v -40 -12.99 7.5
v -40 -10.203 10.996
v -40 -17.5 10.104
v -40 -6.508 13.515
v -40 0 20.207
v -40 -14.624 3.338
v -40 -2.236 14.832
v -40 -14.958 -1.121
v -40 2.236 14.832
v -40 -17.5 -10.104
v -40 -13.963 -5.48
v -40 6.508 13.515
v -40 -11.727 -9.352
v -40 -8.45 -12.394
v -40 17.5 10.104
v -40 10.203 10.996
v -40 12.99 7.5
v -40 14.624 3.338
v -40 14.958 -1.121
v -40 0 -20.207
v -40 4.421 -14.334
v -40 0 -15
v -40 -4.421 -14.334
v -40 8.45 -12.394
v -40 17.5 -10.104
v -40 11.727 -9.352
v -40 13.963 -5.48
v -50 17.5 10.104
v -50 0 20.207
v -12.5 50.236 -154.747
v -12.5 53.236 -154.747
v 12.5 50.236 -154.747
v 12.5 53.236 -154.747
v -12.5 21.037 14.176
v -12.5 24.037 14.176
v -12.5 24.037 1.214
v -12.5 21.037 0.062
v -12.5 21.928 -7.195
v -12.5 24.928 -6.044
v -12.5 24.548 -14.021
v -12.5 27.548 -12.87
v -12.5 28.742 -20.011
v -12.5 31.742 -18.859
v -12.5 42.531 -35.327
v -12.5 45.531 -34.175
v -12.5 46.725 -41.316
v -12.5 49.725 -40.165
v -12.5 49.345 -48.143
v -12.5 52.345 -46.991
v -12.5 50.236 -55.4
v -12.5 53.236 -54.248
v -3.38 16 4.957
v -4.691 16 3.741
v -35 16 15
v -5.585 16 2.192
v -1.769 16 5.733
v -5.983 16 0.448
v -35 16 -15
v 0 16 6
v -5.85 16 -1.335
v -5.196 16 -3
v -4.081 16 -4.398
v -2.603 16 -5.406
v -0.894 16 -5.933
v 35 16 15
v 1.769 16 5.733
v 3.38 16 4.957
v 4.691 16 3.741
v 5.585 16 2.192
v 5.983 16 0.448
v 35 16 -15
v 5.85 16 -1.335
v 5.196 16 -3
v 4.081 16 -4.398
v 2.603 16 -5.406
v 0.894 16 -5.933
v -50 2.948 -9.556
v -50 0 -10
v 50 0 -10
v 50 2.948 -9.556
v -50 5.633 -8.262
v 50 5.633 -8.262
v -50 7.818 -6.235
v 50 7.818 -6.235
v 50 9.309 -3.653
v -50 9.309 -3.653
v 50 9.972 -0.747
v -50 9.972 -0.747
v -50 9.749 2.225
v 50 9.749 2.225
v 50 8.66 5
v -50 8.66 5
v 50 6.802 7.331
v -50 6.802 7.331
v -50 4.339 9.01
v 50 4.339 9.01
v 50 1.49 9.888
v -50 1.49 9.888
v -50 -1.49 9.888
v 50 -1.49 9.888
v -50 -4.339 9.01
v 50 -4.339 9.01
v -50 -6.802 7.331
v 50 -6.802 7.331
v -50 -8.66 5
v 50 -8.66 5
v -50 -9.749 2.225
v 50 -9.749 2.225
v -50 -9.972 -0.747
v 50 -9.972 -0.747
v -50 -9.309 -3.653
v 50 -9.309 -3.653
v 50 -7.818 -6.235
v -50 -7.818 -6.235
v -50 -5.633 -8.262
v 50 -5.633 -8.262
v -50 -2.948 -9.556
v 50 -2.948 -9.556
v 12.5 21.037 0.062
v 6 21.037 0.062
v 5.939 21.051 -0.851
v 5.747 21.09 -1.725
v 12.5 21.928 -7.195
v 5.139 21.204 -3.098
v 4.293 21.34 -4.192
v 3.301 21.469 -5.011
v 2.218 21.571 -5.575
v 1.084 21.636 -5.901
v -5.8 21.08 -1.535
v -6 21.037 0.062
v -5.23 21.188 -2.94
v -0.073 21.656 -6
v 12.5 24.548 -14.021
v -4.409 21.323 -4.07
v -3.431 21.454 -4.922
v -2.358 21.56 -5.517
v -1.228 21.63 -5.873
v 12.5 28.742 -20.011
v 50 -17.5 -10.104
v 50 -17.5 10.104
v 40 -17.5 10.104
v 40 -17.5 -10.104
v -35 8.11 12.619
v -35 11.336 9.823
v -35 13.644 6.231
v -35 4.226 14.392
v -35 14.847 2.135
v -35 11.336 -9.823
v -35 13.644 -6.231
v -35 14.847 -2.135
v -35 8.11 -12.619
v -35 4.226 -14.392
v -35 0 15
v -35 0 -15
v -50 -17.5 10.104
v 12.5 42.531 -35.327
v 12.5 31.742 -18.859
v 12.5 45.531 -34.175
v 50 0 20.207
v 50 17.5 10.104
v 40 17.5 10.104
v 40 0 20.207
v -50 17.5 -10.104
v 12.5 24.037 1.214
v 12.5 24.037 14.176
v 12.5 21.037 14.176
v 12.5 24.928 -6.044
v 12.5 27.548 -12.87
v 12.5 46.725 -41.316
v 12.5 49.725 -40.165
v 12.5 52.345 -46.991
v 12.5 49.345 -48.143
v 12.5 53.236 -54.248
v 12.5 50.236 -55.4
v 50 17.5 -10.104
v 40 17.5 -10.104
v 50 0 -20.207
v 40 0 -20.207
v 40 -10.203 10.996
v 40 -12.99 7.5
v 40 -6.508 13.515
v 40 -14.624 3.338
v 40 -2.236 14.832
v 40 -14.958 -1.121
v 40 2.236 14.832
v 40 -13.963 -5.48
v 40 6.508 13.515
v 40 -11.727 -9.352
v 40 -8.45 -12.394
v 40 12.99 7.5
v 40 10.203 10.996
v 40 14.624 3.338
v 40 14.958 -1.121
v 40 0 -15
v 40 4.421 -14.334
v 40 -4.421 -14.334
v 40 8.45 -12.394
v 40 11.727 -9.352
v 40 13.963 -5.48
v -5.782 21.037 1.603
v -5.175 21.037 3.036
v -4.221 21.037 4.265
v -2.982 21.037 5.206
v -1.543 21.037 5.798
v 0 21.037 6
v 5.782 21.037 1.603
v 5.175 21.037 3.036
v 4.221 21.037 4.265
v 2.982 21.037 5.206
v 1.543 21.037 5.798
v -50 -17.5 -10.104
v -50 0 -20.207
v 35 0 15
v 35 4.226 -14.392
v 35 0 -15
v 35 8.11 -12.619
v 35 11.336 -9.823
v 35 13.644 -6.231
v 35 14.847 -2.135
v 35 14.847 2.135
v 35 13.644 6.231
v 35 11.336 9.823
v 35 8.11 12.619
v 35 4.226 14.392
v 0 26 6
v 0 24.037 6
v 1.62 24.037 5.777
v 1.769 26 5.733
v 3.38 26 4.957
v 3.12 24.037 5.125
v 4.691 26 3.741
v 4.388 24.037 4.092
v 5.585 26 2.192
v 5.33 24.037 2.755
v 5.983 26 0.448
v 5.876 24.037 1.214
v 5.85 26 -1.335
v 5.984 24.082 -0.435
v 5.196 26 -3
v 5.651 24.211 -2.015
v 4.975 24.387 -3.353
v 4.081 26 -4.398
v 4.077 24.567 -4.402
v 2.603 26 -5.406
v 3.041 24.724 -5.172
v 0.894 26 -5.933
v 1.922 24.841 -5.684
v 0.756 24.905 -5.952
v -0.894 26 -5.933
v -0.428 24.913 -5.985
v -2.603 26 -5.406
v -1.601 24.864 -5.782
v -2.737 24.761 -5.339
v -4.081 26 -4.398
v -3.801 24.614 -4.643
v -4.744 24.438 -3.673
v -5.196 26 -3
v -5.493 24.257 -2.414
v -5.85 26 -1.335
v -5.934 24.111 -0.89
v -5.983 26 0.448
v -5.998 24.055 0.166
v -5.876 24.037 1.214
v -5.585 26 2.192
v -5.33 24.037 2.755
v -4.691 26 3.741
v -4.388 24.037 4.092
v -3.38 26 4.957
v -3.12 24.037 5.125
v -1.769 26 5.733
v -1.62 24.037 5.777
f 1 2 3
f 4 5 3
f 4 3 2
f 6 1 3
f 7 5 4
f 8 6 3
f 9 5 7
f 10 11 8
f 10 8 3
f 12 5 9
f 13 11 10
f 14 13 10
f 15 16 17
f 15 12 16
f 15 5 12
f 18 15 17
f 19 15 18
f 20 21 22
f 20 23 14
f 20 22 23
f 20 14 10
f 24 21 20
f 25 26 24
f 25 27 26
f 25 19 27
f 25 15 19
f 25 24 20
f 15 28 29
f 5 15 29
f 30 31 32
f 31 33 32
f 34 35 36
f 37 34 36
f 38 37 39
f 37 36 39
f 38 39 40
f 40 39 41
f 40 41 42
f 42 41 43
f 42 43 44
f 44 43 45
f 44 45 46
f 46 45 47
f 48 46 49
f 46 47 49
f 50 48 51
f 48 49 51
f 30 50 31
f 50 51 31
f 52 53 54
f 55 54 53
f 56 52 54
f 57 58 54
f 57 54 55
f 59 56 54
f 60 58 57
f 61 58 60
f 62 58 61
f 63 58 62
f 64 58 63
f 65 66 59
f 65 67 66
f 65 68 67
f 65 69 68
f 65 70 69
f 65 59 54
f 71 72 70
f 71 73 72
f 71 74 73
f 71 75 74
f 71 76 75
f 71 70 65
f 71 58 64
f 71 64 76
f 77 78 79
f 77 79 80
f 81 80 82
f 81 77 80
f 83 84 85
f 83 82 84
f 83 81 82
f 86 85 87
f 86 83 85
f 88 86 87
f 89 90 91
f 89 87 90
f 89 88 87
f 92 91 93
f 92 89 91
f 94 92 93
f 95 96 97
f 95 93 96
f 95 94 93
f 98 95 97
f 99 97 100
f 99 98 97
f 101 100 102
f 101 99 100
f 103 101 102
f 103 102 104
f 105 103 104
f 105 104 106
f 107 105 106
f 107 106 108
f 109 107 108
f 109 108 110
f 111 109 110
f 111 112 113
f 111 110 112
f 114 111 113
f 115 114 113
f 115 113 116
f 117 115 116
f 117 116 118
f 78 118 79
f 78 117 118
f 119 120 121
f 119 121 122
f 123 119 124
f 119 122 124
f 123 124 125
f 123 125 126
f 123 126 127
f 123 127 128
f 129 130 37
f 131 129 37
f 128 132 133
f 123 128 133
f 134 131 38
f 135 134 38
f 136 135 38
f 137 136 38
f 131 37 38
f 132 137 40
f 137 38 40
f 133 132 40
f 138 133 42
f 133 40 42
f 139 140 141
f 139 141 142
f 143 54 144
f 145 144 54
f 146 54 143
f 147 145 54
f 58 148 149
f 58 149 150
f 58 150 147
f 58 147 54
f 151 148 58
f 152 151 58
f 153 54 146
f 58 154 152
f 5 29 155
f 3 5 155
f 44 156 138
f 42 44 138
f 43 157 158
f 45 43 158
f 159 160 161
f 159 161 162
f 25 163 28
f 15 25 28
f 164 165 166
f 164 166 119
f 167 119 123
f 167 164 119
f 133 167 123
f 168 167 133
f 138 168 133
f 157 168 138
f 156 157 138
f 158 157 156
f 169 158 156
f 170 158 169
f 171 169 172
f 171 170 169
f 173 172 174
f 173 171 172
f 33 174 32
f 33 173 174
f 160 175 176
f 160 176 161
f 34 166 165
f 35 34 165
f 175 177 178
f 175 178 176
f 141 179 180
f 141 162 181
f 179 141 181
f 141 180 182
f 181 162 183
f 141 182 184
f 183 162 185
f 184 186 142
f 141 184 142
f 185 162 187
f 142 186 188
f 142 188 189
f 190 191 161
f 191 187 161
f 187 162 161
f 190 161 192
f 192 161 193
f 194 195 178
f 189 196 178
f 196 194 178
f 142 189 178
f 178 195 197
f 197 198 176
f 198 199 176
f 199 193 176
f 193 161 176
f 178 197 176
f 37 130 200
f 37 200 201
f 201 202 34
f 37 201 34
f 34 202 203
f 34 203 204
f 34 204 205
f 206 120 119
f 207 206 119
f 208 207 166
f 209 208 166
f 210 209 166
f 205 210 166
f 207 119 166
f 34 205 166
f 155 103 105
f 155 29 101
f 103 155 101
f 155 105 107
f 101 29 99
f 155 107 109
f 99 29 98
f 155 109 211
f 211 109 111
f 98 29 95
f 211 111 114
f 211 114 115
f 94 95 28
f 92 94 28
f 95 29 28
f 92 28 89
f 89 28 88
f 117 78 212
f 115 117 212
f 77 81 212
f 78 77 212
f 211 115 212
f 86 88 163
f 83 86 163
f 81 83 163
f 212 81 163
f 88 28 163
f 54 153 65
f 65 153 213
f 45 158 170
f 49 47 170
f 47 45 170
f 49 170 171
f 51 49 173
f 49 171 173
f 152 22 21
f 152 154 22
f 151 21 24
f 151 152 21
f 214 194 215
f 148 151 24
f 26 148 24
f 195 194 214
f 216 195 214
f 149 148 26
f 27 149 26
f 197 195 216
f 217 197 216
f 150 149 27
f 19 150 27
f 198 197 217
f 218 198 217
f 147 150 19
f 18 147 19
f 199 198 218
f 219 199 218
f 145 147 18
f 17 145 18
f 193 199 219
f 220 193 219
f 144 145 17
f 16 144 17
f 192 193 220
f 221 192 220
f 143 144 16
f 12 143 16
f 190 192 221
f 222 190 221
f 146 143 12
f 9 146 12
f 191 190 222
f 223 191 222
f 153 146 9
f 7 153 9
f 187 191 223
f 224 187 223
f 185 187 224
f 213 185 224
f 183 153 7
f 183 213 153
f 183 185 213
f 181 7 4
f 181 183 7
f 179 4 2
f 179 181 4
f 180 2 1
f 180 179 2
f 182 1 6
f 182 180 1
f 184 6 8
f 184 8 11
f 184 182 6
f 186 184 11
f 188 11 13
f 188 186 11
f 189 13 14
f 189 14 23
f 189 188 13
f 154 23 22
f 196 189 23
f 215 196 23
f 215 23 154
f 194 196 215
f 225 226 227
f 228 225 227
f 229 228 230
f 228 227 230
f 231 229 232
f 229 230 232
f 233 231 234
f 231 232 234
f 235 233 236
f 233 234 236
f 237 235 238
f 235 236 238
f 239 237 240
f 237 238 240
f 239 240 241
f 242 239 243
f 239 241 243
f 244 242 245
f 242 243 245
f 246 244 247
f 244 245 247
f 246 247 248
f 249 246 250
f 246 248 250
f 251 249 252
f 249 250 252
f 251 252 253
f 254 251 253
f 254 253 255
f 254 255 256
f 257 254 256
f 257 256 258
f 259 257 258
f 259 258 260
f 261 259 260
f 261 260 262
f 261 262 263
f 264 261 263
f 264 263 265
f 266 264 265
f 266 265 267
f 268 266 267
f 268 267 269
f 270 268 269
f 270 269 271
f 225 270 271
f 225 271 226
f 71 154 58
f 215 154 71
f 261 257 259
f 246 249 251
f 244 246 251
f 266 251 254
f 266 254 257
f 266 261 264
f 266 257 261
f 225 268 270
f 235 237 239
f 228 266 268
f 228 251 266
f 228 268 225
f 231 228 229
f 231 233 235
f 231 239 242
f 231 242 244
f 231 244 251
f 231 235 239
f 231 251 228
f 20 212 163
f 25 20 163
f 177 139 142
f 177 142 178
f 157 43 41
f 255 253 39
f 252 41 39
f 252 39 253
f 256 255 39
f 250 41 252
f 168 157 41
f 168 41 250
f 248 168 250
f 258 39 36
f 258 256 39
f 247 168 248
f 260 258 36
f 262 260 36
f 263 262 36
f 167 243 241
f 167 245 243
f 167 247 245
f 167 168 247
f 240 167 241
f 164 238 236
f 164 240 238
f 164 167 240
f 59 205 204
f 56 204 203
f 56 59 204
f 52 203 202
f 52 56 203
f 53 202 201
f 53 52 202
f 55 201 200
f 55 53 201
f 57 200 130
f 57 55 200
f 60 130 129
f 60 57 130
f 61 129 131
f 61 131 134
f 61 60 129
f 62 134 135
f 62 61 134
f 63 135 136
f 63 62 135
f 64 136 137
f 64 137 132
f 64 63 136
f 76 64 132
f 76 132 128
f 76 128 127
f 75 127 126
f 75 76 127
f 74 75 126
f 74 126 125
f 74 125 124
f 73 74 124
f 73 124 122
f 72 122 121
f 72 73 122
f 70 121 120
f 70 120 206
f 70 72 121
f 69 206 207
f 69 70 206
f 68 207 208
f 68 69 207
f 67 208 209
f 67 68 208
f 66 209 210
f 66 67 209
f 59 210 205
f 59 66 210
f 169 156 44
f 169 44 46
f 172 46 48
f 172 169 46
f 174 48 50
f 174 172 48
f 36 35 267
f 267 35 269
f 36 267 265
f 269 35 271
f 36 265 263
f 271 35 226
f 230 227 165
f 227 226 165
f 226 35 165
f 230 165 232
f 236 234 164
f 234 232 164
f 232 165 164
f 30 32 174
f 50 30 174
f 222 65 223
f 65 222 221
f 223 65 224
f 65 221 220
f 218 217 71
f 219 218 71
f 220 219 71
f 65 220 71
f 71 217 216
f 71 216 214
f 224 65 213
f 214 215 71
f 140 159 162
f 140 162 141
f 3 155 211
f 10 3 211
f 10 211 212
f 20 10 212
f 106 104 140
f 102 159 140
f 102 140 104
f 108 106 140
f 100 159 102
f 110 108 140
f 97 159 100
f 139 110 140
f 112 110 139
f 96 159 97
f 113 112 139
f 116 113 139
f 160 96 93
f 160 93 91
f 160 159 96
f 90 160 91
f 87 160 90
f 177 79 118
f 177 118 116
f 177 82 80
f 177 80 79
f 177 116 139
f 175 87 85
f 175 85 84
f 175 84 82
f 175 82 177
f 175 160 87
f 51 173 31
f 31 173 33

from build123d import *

# Parameters (mm, degrees)
SKETCH1_R               = 15
SKETCH1_R_2             = 5
EXTRUDE_THIN1_DEPTH     = 50
SKETCH2_W               = 70
SKETCH2_H               = 30
BOSS_EXTRUDE1_DEPTH     = 16
SKETCH3_R               = 6
BOSS_EXTRUDE2_DEPTH     = 10
EXTRUDE_THIN2_DEPTH     = 12.5
FILLET1_R               = 30
BOSS_EXTRUDE3_DEPTH     = 10
CUT_EXTRUDE1_DEPTH      = 172.116081143
CUT_EXTRUDE1_DEPTH_BACK = 172.116081143
SKETCH6_R               = 10


with BuildPart() as part:
    # Sketch1 → Extrude-Thin1 (new, symmetric)
    with BuildSketch(Plane(origin=(0, 0, 0), x_dir=(0, 0, -1), z_dir=(1, 0, 0))):
        Circle(SKETCH1_R)
        Circle(SKETCH1_R_2, mode=Mode.SUBTRACT)
    extrude(amount=EXTRUDE_THIN1_DEPTH, both=True)

    # Sketch2 → Boss-Extrude1 (add)
    with BuildSketch(Plane(origin=(0, 0, 0), x_dir=(1, 0, 0), z_dir=(0, 1, 0))):
        Rectangle(SKETCH2_W, SKETCH2_H)
    extrude(amount=BOSS_EXTRUDE1_DEPTH)

    # Sketch3 → Boss-Extrude2 (add)
    with BuildSketch(Plane(origin=(0, 16, 0), x_dir=(1, 0, 0), z_dir=(0, 1, 0))):
        with Locations(Location((0, 0, 0), (0, 0, 270))):
            Circle(SKETCH3_R)
    extrude(amount=BOSS_EXTRUDE2_DEPTH)

    # Sketch4 → Extrude-Thin2 (add, symmetric)
    with BuildSketch(Plane(origin=(0, 0, 0), x_dir=(0, 0, -1), z_dir=(1, 0, 0))):
        Polygon((-14.175668382, 24.036944014), (10.301514998, 24.036944014), (42.733043078, 53.23603901), (154.74701088, 53.23603901), (154.74701088, 50.23603901), (43.884565313, 50.23603901), (11.453037232, 21.036944014), (-14.175668382, 21.036944014), align=None)
    extrude(amount=EXTRUDE_THIN2_DEPTH, both=True)

    # Fillet1
    # the kernel refuses this fillet: 30 mm, written as the material it adds along each edge
    with BuildSketch(Plane(origin=(12.5, 50.23603901, -43.884565313), x_dir=(0, -0.6691004351822665, 0.7431719906178524), z_dir=(-1, 0, 0))) as fillet1_piece_1:
        with BuildLine():
            CenterArc((FILLET1_R * 0.383840744794, -FILLET1_R), FILLET1_R, 90, 41.997673873)
            Line((-FILLET1_R * 0.285259690389, -FILLET1_R * 0.256828009382), (0, 0))
            Line((0, 0), (FILLET1_R * 0.383840744794, 0))
        make_face()
    extrude(amount=25)
    with BuildSketch(Plane(origin=(12.5, 24.036944014, -10.301514998), x_dir=(0, 0, 1), z_dir=(-1, 0, 0))) as fillet1_piece_2:
        with BuildLine():
            CenterArc((FILLET1_R * 0.383840744794, FILLET1_R), FILLET1_R, 228.002326127, 41.997673873)
            Line((-FILLET1_R * 0.285259690389, FILLET1_R * 0.256828009382), (0, 0))
            Line((0, 0), (FILLET1_R * 0.383840744794, 0))
        make_face()
    extrude(amount=25)
    # the kernel refuses this fillet: 30 mm, written as the material it takes off along each edge
    with BuildSketch(Plane(origin=(41.28805586, 53.23603901, -42.733043078), x_dir=(0, -0.6691004351822663, 0.7431719906178528), z_dir=(-1, 0, 0))) as fillet1_2_piece_1:
        with BuildLine():
            CenterArc((FILLET1_R * 0.383840744794, -FILLET1_R), FILLET1_R, 90, 41.997673873)
            Line((-FILLET1_R * 0.285259690389, -FILLET1_R * 0.256828009382), (0, 0))
            Line((0, 0), (FILLET1_R * 0.383840744794, 0))
        make_face()
    extrude(amount=82.576111719, mode=Mode.SUBTRACT)
    with BuildSketch(Plane(origin=(-41.28805586, 21.036944014, -11.453037232), x_dir=(0, 0, 1), z_dir=(1, 0, 0))) as fillet1_2_piece_2_section:
        with BuildLine():
            CenterArc((FILLET1_R * 0.383840744794, -FILLET1_R), FILLET1_R, 90, 41.997673873)
            Line((-FILLET1_R * 0.285259690389, -FILLET1_R * 0.256828009382), (0, 0))
            Line((0, 0), (FILLET1_R * 0.383840744794, 0))
        make_face()
    fillet1_2_piece_2 = extrude(amount=82.576111719, mode=Mode.PRIVATE)
    fillet1_2_piece_2 = fillet1_2_piece_2 - Plane(origin=(0, 22.678661346, 0), x_dir=(0, 0, 1), z_dir=(0, -1, 0)) * Cylinder(6, 212, mode=Mode.PRIVATE)
    add(fillet1_2_piece_2, mode=Mode.SUBTRACT)

    # Sketch5 → Boss-Extrude3 (add)
    with BuildSketch(Plane(origin=(50, 0, 0), x_dir=(0, 0, -1), z_dir=(1, 0, 0))):
        Polygon((-20.207259422, 0), (-10.103629711, -17.5), (10.103629711, -17.5), (20.207259422, 0), (10.103629711, 17.5), (-10.103629711, 17.5), align=None)
    boss_extrude3 = extrude(amount=-BOSS_EXTRUDE3_DEPTH)

    # Mirror1: Boss-Extrude3 across plane
    add(boss_extrude3.mirror(Plane(origin=(0, 0, 0), x_dir=(0, 0, 1), z_dir=(1, 0, 0))))

    # Sketch6 → Cut-Extrude1 (cut, two sides: drawn at the far end of the back side and taken through both)
    with BuildSketch(Plane(origin=(0, 0, 0), x_dir=(0, 0, -1), z_dir=(1, 0, 0)).offset(-CUT_EXTRUDE1_DEPTH_BACK)):
        Circle(SKETCH6_R)
    extrude(amount=CUT_EXTRUDE1_DEPTH + CUT_EXTRUDE1_DEPTH_BACK, mode=Mode.SUBTRACT)


solid = part.part
